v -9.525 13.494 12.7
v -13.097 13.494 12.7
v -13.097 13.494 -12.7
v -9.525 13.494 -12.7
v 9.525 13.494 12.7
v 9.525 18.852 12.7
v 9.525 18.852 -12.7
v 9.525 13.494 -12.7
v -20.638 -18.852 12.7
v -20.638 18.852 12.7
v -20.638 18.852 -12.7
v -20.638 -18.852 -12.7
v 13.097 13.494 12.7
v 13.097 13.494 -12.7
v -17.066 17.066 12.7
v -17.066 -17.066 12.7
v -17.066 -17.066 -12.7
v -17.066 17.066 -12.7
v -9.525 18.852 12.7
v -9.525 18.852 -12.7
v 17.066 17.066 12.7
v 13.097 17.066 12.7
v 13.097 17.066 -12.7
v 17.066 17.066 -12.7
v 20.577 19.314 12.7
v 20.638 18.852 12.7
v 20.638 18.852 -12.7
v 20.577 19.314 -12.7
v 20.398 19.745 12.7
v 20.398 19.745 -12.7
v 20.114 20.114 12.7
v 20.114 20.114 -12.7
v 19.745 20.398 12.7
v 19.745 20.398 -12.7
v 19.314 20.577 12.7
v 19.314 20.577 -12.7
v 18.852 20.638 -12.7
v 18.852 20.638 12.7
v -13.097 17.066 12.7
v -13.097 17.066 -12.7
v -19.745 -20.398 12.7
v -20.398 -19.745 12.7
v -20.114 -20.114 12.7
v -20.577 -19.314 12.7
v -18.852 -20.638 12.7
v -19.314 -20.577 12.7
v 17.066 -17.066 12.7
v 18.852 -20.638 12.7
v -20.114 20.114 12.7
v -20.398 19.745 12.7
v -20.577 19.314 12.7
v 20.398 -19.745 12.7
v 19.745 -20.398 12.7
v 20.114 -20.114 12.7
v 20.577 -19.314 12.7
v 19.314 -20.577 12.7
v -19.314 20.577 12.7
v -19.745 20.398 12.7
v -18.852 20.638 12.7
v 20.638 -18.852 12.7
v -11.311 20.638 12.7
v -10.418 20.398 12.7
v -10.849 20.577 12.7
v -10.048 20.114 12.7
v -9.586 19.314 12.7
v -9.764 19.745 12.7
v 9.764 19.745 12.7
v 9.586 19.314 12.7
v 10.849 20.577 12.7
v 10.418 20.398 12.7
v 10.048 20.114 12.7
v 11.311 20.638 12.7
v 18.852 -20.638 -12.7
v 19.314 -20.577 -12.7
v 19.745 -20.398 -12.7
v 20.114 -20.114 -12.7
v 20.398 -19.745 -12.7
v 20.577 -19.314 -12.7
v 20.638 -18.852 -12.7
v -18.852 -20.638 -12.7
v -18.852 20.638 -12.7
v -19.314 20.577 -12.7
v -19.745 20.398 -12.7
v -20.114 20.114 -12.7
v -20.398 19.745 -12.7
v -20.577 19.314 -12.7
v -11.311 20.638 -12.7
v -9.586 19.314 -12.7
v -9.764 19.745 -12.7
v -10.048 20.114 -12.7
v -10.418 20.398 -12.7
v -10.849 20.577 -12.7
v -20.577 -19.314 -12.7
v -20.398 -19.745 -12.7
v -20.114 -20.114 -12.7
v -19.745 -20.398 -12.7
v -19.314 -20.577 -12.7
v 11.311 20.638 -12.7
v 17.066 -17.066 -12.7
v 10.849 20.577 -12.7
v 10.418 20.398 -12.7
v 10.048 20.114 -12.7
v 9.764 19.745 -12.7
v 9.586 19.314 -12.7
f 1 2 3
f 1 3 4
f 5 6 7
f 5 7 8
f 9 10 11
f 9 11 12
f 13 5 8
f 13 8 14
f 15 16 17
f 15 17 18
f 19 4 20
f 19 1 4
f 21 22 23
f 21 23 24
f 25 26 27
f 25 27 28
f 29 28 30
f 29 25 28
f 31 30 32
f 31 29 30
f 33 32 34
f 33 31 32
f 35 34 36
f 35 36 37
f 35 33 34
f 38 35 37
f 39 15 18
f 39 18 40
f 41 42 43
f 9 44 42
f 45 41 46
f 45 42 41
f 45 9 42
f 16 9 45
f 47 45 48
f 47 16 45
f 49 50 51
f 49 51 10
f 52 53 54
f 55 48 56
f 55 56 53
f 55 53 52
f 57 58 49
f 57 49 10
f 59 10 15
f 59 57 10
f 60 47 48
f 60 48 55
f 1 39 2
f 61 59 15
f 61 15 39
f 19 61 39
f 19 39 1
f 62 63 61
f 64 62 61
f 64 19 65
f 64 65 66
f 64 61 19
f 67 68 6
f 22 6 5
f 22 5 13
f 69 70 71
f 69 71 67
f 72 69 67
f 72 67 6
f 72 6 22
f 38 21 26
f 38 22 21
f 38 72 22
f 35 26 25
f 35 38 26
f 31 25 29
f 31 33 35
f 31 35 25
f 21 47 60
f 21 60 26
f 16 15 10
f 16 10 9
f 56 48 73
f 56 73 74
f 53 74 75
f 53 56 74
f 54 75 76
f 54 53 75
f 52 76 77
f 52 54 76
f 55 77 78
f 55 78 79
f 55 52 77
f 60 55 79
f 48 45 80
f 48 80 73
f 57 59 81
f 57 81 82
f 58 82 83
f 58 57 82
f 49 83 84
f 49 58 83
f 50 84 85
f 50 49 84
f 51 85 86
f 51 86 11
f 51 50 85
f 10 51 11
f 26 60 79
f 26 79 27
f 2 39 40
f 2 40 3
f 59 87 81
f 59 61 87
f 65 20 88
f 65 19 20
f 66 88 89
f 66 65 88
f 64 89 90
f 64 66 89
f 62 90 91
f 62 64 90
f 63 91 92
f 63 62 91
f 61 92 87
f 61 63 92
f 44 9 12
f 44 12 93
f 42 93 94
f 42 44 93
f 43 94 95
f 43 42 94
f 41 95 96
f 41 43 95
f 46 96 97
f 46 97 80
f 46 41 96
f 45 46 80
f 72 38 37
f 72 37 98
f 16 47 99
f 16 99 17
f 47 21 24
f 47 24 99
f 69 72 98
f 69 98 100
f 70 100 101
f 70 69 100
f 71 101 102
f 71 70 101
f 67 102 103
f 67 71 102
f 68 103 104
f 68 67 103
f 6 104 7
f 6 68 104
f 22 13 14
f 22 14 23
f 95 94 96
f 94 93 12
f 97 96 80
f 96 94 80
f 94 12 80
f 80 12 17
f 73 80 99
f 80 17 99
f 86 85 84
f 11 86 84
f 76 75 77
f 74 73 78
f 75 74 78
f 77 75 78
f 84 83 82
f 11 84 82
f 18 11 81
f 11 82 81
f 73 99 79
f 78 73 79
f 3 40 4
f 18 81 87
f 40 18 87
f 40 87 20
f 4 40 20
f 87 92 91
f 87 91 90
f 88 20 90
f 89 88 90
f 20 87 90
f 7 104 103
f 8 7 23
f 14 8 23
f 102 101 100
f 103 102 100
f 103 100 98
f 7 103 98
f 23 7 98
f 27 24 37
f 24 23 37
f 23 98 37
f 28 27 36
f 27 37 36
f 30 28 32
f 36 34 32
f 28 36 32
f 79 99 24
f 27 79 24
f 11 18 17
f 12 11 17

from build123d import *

# Parameters (mm, degrees)
BASE_EXTRUDE_DEPTH = 12.7


with BuildPart() as part:
    # Sketch1 → Base-Extrude (new, symmetric)
    with BuildSketch(Plane.XY):
        with BuildLine():
            Line((-11.3109375, 20.6375), (-18.8515625, 20.6375))
            ThreePointArc((-18.8515625, 20.6375), (-20.114411017, 20.114411017), (-20.6375, 18.8515625))
            Line((-20.6375, 18.8515625), (-20.6375, -18.8515625))
            ThreePointArc((-20.6375, -18.8515625), (-20.114411017, -20.114411017), (-18.8515625, -20.6375))
            Line((-18.8515625, -20.6375), (18.8515625, -20.6375))
            ThreePointArc((18.8515625, -20.6375), (20.114411017, -20.114411017), (20.6375, -18.8515625))
            Line((20.6375, -18.8515625), (20.6375, 18.8515625))
            ThreePointArc((20.6375, 18.8515625), (20.114411017, 20.114411017), (18.8515625, 20.6375))
            Line((18.8515625, 20.6375), (11.3109375, 20.6375))
            ThreePointArc((11.3109375, 20.6375), (10.048088983, 20.114411017), (9.525, 18.8515625))
            Line((9.525, 18.8515625), (9.525, 13.49375))
            Line((9.525, 13.49375), (13.096875, 13.49375))
            Line((13.096875, 13.49375), (13.096875, 17.065625))
            Line((13.096875, 17.065625), (17.065625, 17.065625))
            Line((17.065625, 17.065625), (17.065625, -17.065625))
            Line((17.065625, -17.065625), (-17.065625, -17.065625))
            Line((-17.065625, -17.065625), (-17.065625, 17.065625))
            Line((-17.065625, 17.065625), (-13.096875, 17.065625))
            Line((-13.096875, 17.065625), (-13.096875, 13.49375))
            Line((-13.096875, 13.49375), (-9.525, 13.49375))
            Line((-9.525, 13.49375), (-9.525, 18.8515625))
            ThreePointArc((-9.525, 18.8515625), (-10.048088983, 20.114411017), (-11.3109375, 20.6375))
        make_face()
    extrude(amount=BASE_EXTRUDE_DEPTH, both=True)


solid = part.part
